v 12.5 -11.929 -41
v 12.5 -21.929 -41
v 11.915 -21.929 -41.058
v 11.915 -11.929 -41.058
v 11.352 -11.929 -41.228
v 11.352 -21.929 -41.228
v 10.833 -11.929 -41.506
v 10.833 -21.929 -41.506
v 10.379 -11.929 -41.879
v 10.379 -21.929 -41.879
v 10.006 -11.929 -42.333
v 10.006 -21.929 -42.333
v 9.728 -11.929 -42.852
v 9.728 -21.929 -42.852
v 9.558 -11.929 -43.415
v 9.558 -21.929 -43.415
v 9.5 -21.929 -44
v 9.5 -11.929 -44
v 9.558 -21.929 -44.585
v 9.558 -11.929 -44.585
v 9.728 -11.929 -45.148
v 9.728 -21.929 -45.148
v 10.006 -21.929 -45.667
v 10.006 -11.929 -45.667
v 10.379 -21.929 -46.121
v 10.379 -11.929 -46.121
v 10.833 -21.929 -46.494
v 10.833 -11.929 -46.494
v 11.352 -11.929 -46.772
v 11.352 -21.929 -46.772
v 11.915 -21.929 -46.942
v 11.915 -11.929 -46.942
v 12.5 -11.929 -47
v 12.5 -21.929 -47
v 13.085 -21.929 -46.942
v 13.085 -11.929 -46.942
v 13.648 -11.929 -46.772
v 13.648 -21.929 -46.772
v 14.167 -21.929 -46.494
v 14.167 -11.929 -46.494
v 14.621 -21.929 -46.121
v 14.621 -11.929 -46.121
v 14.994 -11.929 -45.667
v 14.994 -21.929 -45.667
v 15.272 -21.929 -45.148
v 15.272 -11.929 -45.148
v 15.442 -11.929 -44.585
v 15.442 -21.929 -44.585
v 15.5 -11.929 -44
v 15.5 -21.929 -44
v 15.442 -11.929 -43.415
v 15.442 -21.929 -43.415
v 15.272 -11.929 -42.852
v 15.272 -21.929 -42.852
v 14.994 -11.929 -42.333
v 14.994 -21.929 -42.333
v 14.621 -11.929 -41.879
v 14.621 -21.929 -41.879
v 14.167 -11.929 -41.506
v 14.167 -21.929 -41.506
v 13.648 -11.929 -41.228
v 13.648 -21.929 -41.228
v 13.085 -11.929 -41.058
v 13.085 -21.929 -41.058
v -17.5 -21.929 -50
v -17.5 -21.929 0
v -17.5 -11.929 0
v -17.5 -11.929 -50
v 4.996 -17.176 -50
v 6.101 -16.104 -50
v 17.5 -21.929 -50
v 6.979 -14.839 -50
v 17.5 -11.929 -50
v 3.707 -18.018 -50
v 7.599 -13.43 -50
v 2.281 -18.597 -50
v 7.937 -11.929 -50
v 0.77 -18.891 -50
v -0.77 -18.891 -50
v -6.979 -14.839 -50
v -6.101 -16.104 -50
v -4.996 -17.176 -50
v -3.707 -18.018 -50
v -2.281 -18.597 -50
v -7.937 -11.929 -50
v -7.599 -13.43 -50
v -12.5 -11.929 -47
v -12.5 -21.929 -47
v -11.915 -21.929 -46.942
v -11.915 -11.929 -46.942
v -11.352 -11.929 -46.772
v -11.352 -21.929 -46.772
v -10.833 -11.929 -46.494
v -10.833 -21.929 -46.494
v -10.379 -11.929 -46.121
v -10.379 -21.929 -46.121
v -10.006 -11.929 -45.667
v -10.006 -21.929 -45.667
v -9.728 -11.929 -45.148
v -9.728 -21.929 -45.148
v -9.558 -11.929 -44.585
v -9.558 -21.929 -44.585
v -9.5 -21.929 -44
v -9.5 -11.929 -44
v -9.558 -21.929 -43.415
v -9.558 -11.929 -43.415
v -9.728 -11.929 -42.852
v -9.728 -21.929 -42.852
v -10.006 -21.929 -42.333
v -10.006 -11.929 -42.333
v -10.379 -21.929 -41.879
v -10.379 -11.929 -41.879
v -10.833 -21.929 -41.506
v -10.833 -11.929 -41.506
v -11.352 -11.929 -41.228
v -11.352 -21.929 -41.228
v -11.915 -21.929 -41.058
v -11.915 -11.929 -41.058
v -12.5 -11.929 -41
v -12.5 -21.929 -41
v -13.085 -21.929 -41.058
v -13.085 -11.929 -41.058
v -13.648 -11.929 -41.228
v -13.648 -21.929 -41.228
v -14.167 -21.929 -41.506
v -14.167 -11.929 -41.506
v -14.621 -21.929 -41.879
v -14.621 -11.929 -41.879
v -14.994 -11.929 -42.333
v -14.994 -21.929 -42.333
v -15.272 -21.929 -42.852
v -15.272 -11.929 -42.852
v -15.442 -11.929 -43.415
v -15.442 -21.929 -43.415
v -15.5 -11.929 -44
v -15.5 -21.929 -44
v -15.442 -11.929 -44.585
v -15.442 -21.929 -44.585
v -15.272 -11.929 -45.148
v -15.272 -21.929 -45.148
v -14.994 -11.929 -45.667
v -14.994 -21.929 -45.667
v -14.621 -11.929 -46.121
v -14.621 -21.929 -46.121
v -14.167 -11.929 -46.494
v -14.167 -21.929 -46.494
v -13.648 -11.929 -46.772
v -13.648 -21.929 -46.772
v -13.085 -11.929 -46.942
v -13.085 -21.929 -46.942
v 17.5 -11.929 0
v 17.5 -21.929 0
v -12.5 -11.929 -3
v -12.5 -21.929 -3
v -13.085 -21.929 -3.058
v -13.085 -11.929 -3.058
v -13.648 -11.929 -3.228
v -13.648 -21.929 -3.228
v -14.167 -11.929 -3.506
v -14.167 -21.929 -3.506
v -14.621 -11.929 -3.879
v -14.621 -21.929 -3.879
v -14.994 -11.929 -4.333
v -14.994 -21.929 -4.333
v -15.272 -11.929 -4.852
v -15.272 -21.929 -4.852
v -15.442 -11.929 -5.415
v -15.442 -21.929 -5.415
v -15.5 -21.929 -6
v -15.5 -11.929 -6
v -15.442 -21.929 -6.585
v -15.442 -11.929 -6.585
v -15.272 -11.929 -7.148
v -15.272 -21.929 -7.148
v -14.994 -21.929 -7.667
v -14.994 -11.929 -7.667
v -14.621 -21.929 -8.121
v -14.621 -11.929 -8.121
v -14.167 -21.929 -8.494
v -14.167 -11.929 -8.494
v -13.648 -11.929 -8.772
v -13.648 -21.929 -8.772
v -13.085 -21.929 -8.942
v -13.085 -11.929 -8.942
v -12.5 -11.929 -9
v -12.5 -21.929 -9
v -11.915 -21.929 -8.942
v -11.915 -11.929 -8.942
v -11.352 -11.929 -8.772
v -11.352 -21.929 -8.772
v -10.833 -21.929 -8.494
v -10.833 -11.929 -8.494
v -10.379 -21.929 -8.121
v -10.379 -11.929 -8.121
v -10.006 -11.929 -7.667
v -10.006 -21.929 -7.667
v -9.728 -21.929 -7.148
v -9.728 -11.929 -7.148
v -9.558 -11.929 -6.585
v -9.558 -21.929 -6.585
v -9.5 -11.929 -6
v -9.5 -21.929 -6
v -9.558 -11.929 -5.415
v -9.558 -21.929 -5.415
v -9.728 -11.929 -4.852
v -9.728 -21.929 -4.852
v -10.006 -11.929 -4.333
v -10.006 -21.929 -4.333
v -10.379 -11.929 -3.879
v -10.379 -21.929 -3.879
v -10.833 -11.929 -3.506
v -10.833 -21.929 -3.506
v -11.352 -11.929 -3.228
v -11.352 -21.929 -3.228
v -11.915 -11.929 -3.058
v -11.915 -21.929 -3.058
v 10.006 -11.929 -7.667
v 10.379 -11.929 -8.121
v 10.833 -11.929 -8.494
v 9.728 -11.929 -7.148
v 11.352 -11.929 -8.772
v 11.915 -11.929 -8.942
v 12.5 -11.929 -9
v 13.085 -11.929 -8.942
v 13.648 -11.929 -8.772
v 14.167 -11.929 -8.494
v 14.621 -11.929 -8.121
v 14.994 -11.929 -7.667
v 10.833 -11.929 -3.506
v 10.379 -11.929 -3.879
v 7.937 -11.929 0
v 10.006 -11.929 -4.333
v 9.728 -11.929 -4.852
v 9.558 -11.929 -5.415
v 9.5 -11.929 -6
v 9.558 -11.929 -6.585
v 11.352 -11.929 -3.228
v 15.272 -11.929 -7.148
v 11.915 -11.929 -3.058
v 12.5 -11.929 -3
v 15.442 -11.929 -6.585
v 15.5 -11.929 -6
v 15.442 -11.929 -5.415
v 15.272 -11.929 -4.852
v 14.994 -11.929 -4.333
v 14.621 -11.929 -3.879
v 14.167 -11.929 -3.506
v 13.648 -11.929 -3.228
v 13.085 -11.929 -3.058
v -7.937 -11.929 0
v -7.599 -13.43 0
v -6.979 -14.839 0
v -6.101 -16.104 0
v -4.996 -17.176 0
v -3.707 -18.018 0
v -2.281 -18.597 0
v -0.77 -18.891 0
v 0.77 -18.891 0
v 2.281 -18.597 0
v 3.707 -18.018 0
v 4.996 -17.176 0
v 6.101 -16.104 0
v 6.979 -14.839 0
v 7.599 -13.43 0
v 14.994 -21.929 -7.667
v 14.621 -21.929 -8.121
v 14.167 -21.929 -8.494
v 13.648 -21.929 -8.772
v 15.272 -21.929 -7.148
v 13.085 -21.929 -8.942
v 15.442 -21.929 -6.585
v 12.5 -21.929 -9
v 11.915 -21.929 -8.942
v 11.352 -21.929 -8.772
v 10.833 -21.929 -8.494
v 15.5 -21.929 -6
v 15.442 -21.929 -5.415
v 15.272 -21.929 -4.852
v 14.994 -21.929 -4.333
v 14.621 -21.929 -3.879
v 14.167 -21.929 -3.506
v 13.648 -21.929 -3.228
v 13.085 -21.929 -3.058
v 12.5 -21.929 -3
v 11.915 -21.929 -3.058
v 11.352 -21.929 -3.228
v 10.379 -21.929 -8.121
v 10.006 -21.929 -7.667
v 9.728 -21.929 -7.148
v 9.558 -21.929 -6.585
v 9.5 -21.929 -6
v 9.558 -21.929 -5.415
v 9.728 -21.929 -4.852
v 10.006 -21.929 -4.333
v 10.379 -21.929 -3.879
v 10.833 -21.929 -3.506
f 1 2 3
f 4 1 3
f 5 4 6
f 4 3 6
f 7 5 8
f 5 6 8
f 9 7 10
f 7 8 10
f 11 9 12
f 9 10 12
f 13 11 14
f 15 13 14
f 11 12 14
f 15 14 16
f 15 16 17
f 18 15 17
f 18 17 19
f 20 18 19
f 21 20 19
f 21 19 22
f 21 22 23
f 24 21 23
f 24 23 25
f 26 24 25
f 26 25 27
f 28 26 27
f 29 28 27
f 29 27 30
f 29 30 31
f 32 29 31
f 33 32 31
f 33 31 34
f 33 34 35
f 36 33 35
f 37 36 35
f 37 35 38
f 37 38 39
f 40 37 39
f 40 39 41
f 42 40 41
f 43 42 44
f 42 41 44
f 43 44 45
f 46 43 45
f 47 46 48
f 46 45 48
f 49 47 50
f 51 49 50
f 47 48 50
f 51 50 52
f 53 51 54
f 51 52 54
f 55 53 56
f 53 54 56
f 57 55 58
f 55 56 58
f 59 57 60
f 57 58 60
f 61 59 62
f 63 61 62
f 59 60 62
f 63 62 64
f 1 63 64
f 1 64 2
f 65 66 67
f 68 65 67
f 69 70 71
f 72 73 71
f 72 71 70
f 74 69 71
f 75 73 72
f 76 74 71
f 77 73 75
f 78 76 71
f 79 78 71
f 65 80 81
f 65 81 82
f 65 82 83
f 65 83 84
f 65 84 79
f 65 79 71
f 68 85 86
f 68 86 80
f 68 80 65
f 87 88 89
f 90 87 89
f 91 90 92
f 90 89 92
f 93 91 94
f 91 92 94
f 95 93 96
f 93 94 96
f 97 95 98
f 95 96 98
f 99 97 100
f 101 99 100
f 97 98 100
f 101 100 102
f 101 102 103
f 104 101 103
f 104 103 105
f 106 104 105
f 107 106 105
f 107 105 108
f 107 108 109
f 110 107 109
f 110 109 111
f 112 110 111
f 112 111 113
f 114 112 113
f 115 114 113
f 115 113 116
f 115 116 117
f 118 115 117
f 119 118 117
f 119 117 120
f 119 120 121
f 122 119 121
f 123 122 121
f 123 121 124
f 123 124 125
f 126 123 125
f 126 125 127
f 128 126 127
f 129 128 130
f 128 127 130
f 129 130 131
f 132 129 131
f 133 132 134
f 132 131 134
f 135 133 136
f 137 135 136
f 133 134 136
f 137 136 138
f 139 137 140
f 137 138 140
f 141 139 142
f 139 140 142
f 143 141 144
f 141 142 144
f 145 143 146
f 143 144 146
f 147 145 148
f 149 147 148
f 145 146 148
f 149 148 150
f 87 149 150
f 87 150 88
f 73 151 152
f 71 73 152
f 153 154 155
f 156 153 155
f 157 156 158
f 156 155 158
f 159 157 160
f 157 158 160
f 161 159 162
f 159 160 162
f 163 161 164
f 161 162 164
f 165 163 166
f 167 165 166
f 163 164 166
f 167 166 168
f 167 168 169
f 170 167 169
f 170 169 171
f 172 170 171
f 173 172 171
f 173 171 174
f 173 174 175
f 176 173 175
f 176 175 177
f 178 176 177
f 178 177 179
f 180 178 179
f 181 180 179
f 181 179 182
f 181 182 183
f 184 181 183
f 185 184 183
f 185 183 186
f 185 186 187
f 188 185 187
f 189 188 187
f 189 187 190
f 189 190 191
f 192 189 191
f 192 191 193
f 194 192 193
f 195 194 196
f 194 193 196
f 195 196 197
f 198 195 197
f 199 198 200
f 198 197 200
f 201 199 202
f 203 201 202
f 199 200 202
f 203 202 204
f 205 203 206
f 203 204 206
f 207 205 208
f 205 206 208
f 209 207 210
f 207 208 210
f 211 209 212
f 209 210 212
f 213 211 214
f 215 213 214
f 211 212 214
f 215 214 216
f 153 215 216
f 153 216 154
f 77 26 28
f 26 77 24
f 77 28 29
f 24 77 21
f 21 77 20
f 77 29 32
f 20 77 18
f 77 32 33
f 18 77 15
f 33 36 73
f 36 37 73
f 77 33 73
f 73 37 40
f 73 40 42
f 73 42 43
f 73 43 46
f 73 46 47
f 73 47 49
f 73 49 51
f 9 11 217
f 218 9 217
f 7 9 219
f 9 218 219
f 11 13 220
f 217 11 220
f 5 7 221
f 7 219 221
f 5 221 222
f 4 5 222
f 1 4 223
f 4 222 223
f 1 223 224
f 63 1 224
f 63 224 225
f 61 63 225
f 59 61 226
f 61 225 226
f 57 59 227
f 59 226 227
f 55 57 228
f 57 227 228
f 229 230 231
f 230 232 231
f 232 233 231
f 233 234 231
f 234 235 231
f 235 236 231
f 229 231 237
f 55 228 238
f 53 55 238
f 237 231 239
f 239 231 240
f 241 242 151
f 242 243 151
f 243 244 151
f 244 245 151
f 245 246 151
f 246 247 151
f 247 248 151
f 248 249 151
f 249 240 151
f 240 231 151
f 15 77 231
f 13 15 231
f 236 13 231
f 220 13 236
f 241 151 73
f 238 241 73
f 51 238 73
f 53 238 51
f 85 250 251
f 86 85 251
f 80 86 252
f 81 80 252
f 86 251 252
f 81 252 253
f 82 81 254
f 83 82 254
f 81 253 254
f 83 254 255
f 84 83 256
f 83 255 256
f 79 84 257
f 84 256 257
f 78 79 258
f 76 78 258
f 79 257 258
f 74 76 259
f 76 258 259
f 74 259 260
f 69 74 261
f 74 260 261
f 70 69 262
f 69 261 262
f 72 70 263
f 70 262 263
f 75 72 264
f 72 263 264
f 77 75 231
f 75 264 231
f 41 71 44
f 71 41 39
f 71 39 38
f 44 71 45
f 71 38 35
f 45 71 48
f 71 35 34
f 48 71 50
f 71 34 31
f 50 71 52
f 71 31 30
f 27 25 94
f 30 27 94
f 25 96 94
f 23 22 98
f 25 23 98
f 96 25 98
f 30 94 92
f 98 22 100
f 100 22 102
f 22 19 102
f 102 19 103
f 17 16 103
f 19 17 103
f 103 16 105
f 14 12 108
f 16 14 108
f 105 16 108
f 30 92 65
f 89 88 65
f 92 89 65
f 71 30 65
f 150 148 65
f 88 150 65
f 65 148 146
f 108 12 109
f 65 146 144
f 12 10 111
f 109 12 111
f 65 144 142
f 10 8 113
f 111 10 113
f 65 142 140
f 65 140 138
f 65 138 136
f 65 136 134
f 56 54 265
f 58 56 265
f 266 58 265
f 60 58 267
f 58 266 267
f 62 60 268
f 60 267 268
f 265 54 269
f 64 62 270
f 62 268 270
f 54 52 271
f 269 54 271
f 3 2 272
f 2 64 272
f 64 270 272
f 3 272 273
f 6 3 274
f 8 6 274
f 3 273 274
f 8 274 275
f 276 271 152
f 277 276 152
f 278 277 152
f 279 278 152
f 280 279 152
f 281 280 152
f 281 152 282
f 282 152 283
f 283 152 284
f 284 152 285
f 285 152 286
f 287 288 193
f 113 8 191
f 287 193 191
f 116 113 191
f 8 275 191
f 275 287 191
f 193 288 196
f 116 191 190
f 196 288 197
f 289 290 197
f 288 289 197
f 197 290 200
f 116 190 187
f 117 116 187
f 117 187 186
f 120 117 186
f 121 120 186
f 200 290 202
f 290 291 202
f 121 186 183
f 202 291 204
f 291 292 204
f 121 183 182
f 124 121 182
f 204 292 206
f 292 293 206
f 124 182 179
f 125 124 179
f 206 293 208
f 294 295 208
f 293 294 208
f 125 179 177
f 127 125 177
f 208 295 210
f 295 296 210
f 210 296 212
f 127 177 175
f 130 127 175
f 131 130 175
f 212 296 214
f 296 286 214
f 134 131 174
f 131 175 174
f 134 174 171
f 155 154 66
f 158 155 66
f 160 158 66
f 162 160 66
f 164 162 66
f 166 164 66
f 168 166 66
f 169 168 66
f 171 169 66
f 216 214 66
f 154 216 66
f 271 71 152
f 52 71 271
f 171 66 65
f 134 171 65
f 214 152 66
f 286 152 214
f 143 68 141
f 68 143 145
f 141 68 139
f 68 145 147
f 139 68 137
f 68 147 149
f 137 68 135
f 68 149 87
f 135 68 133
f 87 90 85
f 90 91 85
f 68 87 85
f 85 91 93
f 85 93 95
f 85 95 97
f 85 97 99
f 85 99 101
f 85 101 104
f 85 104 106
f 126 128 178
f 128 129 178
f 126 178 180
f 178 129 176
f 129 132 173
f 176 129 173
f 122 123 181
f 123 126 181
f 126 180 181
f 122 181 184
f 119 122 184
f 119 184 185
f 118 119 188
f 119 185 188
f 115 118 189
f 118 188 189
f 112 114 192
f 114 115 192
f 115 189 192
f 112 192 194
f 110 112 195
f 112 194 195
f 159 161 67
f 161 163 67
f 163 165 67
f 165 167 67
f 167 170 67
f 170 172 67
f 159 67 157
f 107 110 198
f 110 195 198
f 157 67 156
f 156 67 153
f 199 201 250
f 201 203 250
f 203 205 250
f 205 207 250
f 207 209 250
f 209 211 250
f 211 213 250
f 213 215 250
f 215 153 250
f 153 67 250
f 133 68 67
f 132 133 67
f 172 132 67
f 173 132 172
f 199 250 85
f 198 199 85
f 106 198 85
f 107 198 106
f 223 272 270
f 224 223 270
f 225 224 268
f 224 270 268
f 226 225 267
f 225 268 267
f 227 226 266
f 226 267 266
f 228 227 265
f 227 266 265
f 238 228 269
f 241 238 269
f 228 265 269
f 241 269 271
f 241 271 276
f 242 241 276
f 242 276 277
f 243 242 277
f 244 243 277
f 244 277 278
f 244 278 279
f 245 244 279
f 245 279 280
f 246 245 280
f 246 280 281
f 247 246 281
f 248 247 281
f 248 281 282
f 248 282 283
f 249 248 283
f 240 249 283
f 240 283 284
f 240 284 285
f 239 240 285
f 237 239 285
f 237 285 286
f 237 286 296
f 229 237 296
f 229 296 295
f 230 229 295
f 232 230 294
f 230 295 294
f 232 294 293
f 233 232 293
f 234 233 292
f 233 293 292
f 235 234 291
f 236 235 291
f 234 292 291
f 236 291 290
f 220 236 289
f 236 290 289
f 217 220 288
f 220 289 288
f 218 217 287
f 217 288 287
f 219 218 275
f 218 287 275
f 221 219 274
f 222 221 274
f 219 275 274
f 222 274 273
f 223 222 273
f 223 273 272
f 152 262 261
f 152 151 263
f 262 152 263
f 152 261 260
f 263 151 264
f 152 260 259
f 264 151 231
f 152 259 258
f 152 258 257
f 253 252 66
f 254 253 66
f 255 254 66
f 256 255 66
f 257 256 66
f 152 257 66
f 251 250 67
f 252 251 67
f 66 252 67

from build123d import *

# Parameters (mm, degrees)
BOSS_EXTRUDE1_DEPTH = 50
SKETCH3_R           = 3
CUT_EXTRUDE1_DEPTH  = 54.909646632


with BuildPart() as part:
    # Sketch2 → Boss-Extrude1 (new body)
    with BuildSketch(Plane.XY):
        with BuildLine():
            Line((-17.5, -11.928580859), (-7.937253933, -11.928580859))
            ThreePointArc((-7.937253933, -11.928580859), (0, -18.928580859), (7.937253933, -11.928580859))
            Line((7.937253933, -11.928580859), (17.5, -11.928580859))
            Line((17.5, -11.928580859), (17.5, -21.928580859))
            Line((17.5, -21.928580859), (-17.5, -21.928580859))
            Line((-17.5, -21.928580859), (-17.5, -11.928580859))
        make_face()
    extrude(amount=-BOSS_EXTRUDE1_DEPTH)

    # Sketch3 → Cut-Extrude1 (cut, through all)
    with BuildSketch(Plane.XZ.offset(21.928580859)):
        with Locations(Location((12.5, -6, 0), (0, 0, 270))):
            Circle(SKETCH3_R)
        with Locations(Location((-12.5, -6, 0), (0, 0, 90))):
            Circle(SKETCH3_R)
        with Locations(Location((-12.5, -44, 0), (0, 0, 270))):
            Circle(SKETCH3_R)
        with Locations(Location((12.5, -44, 0), (0, 0, 90))):
            Circle(SKETCH3_R)
    extrude(amount=-CUT_EXTRUDE1_DEPTH, mode=Mode.SUBTRACT)


solid = part.part
